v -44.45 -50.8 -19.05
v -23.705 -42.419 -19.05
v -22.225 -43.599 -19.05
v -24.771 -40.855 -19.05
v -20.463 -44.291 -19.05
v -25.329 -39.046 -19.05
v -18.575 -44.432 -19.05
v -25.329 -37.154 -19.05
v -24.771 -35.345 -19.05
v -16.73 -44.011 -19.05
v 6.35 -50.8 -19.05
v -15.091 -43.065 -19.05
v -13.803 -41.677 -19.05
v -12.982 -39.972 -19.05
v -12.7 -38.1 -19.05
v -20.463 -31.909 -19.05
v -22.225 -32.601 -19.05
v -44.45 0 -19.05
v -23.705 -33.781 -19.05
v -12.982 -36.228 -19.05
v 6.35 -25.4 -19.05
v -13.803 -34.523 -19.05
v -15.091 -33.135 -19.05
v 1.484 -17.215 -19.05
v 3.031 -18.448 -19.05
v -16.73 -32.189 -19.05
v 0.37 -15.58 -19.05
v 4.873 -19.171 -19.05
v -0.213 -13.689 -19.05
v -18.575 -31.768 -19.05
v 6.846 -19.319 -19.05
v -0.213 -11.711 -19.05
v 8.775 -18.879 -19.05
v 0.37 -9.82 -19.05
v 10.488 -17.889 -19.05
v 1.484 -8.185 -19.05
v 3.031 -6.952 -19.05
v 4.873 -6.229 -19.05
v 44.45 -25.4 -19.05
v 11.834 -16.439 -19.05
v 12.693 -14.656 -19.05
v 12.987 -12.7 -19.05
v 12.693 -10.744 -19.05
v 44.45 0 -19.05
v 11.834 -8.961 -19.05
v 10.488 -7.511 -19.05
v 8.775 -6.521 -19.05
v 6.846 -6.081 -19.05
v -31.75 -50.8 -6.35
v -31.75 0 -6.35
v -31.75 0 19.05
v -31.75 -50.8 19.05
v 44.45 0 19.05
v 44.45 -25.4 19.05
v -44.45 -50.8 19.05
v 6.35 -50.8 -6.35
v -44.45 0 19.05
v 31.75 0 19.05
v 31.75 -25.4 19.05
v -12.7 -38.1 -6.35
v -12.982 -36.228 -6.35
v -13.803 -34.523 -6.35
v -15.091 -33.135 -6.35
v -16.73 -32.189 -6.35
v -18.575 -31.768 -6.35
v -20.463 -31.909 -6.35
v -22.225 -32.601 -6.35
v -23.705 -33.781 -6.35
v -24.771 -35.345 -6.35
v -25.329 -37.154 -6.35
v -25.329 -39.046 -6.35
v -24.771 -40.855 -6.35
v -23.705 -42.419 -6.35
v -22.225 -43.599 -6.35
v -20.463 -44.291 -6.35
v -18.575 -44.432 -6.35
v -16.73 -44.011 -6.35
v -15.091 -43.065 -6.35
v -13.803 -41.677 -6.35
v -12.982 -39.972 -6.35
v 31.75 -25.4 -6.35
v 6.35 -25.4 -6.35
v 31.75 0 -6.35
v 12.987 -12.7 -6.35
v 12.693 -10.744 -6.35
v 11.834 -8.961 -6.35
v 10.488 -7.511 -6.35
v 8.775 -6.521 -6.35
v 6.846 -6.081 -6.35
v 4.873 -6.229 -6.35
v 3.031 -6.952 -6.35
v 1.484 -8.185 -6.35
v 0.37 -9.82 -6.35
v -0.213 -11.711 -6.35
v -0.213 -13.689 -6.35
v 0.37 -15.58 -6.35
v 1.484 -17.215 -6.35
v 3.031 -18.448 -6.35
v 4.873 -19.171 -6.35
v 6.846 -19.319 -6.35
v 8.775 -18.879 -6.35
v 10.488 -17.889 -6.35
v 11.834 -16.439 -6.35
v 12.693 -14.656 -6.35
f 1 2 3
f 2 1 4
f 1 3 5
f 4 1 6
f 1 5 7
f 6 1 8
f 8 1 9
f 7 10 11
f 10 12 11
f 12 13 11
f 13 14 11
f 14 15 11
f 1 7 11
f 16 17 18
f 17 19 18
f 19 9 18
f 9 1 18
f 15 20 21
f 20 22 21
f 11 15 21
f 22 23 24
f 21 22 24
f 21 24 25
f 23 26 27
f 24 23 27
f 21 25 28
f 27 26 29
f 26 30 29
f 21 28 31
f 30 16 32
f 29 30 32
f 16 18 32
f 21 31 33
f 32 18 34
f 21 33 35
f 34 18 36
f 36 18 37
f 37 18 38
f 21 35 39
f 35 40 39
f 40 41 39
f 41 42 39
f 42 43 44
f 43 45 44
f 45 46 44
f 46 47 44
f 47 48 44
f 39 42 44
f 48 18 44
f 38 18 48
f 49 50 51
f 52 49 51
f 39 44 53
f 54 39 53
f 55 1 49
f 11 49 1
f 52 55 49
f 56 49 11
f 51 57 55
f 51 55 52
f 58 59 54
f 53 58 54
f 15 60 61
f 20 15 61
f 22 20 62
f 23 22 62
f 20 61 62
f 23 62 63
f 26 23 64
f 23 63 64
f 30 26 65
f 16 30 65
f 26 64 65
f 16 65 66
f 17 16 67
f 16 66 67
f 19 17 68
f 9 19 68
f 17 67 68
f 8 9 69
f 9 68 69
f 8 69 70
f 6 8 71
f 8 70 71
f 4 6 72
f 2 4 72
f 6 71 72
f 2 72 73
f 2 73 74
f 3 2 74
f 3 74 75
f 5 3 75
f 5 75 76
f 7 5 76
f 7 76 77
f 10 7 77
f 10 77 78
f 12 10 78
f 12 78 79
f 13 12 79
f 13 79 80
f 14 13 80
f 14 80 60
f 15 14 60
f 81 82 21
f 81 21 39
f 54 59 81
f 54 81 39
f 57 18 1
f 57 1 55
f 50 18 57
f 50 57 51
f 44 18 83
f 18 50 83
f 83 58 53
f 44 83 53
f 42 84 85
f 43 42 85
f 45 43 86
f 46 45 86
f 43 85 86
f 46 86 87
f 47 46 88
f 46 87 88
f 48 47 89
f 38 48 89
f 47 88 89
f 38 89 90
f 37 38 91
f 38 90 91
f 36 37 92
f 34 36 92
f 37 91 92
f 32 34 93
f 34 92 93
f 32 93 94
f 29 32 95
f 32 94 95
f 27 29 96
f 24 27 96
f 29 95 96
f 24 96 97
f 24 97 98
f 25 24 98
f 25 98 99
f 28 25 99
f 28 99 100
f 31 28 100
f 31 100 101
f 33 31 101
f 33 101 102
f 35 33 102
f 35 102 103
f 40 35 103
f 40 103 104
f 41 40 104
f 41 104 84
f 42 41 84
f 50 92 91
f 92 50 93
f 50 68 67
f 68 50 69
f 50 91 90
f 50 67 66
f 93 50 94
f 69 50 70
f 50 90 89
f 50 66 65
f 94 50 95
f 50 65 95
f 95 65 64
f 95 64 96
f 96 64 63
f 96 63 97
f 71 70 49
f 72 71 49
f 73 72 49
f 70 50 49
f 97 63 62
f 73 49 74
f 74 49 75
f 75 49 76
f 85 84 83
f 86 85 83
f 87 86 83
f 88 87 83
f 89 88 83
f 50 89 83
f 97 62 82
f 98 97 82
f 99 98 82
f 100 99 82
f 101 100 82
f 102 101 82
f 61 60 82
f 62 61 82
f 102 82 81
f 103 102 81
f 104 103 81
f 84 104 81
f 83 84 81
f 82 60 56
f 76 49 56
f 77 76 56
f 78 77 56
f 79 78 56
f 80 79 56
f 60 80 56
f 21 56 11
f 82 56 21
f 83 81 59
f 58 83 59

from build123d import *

# Parameters (mm, degrees)
F0_W     = 88.9
F0_H     = 38.1
F1_DEPTH = 50.8
F2_W     = 38.1
F2_H     = 25.4
F3_DEPTH = 38.101
F4_W     = 63.5
F4_H     = 25.4
F5_DEPTH = 50.801
F6_R     = 6.35
F6_R_2   = 6.637383
F7_DEPTH = 12.701


with BuildPart() as f1:
    # F0 (on Front) → F1 (new body)
    with BuildSketch(Plane.XZ):
        Rectangle(F0_W, F0_H)
    extrude(amount=F1_DEPTH)

    # F2 (on face) → F3 (cut, through all)
    with BuildSketch(Plane.XY.offset(19.05)):
        with Locations((25.4, -38.1)):
            Rectangle(F2_W, F2_H)
    extrude(amount=-F3_DEPTH, mode=Mode.SUBTRACT)

    # F4 (on face) → F5 (cut, through all)
    with BuildSketch(Plane.XZ.offset(50.8)):
        with Locations((0, 6.35)):
            Rectangle(F4_W, F4_H)
    extrude(amount=-F5_DEPTH, mode=Mode.SUBTRACT)

    # F6 (on face) → F7 (cut, through all)
    with BuildSketch(Plane.XY.offset(-6.35)):
        with Locations((-19.05, -38.1)):
            Circle(F6_R)
        with Locations((6.35, -12.7)):
            Circle(F6_R_2)
    extrude(amount=-F7_DEPTH, mode=Mode.SUBTRACT)


solid = f1.part
